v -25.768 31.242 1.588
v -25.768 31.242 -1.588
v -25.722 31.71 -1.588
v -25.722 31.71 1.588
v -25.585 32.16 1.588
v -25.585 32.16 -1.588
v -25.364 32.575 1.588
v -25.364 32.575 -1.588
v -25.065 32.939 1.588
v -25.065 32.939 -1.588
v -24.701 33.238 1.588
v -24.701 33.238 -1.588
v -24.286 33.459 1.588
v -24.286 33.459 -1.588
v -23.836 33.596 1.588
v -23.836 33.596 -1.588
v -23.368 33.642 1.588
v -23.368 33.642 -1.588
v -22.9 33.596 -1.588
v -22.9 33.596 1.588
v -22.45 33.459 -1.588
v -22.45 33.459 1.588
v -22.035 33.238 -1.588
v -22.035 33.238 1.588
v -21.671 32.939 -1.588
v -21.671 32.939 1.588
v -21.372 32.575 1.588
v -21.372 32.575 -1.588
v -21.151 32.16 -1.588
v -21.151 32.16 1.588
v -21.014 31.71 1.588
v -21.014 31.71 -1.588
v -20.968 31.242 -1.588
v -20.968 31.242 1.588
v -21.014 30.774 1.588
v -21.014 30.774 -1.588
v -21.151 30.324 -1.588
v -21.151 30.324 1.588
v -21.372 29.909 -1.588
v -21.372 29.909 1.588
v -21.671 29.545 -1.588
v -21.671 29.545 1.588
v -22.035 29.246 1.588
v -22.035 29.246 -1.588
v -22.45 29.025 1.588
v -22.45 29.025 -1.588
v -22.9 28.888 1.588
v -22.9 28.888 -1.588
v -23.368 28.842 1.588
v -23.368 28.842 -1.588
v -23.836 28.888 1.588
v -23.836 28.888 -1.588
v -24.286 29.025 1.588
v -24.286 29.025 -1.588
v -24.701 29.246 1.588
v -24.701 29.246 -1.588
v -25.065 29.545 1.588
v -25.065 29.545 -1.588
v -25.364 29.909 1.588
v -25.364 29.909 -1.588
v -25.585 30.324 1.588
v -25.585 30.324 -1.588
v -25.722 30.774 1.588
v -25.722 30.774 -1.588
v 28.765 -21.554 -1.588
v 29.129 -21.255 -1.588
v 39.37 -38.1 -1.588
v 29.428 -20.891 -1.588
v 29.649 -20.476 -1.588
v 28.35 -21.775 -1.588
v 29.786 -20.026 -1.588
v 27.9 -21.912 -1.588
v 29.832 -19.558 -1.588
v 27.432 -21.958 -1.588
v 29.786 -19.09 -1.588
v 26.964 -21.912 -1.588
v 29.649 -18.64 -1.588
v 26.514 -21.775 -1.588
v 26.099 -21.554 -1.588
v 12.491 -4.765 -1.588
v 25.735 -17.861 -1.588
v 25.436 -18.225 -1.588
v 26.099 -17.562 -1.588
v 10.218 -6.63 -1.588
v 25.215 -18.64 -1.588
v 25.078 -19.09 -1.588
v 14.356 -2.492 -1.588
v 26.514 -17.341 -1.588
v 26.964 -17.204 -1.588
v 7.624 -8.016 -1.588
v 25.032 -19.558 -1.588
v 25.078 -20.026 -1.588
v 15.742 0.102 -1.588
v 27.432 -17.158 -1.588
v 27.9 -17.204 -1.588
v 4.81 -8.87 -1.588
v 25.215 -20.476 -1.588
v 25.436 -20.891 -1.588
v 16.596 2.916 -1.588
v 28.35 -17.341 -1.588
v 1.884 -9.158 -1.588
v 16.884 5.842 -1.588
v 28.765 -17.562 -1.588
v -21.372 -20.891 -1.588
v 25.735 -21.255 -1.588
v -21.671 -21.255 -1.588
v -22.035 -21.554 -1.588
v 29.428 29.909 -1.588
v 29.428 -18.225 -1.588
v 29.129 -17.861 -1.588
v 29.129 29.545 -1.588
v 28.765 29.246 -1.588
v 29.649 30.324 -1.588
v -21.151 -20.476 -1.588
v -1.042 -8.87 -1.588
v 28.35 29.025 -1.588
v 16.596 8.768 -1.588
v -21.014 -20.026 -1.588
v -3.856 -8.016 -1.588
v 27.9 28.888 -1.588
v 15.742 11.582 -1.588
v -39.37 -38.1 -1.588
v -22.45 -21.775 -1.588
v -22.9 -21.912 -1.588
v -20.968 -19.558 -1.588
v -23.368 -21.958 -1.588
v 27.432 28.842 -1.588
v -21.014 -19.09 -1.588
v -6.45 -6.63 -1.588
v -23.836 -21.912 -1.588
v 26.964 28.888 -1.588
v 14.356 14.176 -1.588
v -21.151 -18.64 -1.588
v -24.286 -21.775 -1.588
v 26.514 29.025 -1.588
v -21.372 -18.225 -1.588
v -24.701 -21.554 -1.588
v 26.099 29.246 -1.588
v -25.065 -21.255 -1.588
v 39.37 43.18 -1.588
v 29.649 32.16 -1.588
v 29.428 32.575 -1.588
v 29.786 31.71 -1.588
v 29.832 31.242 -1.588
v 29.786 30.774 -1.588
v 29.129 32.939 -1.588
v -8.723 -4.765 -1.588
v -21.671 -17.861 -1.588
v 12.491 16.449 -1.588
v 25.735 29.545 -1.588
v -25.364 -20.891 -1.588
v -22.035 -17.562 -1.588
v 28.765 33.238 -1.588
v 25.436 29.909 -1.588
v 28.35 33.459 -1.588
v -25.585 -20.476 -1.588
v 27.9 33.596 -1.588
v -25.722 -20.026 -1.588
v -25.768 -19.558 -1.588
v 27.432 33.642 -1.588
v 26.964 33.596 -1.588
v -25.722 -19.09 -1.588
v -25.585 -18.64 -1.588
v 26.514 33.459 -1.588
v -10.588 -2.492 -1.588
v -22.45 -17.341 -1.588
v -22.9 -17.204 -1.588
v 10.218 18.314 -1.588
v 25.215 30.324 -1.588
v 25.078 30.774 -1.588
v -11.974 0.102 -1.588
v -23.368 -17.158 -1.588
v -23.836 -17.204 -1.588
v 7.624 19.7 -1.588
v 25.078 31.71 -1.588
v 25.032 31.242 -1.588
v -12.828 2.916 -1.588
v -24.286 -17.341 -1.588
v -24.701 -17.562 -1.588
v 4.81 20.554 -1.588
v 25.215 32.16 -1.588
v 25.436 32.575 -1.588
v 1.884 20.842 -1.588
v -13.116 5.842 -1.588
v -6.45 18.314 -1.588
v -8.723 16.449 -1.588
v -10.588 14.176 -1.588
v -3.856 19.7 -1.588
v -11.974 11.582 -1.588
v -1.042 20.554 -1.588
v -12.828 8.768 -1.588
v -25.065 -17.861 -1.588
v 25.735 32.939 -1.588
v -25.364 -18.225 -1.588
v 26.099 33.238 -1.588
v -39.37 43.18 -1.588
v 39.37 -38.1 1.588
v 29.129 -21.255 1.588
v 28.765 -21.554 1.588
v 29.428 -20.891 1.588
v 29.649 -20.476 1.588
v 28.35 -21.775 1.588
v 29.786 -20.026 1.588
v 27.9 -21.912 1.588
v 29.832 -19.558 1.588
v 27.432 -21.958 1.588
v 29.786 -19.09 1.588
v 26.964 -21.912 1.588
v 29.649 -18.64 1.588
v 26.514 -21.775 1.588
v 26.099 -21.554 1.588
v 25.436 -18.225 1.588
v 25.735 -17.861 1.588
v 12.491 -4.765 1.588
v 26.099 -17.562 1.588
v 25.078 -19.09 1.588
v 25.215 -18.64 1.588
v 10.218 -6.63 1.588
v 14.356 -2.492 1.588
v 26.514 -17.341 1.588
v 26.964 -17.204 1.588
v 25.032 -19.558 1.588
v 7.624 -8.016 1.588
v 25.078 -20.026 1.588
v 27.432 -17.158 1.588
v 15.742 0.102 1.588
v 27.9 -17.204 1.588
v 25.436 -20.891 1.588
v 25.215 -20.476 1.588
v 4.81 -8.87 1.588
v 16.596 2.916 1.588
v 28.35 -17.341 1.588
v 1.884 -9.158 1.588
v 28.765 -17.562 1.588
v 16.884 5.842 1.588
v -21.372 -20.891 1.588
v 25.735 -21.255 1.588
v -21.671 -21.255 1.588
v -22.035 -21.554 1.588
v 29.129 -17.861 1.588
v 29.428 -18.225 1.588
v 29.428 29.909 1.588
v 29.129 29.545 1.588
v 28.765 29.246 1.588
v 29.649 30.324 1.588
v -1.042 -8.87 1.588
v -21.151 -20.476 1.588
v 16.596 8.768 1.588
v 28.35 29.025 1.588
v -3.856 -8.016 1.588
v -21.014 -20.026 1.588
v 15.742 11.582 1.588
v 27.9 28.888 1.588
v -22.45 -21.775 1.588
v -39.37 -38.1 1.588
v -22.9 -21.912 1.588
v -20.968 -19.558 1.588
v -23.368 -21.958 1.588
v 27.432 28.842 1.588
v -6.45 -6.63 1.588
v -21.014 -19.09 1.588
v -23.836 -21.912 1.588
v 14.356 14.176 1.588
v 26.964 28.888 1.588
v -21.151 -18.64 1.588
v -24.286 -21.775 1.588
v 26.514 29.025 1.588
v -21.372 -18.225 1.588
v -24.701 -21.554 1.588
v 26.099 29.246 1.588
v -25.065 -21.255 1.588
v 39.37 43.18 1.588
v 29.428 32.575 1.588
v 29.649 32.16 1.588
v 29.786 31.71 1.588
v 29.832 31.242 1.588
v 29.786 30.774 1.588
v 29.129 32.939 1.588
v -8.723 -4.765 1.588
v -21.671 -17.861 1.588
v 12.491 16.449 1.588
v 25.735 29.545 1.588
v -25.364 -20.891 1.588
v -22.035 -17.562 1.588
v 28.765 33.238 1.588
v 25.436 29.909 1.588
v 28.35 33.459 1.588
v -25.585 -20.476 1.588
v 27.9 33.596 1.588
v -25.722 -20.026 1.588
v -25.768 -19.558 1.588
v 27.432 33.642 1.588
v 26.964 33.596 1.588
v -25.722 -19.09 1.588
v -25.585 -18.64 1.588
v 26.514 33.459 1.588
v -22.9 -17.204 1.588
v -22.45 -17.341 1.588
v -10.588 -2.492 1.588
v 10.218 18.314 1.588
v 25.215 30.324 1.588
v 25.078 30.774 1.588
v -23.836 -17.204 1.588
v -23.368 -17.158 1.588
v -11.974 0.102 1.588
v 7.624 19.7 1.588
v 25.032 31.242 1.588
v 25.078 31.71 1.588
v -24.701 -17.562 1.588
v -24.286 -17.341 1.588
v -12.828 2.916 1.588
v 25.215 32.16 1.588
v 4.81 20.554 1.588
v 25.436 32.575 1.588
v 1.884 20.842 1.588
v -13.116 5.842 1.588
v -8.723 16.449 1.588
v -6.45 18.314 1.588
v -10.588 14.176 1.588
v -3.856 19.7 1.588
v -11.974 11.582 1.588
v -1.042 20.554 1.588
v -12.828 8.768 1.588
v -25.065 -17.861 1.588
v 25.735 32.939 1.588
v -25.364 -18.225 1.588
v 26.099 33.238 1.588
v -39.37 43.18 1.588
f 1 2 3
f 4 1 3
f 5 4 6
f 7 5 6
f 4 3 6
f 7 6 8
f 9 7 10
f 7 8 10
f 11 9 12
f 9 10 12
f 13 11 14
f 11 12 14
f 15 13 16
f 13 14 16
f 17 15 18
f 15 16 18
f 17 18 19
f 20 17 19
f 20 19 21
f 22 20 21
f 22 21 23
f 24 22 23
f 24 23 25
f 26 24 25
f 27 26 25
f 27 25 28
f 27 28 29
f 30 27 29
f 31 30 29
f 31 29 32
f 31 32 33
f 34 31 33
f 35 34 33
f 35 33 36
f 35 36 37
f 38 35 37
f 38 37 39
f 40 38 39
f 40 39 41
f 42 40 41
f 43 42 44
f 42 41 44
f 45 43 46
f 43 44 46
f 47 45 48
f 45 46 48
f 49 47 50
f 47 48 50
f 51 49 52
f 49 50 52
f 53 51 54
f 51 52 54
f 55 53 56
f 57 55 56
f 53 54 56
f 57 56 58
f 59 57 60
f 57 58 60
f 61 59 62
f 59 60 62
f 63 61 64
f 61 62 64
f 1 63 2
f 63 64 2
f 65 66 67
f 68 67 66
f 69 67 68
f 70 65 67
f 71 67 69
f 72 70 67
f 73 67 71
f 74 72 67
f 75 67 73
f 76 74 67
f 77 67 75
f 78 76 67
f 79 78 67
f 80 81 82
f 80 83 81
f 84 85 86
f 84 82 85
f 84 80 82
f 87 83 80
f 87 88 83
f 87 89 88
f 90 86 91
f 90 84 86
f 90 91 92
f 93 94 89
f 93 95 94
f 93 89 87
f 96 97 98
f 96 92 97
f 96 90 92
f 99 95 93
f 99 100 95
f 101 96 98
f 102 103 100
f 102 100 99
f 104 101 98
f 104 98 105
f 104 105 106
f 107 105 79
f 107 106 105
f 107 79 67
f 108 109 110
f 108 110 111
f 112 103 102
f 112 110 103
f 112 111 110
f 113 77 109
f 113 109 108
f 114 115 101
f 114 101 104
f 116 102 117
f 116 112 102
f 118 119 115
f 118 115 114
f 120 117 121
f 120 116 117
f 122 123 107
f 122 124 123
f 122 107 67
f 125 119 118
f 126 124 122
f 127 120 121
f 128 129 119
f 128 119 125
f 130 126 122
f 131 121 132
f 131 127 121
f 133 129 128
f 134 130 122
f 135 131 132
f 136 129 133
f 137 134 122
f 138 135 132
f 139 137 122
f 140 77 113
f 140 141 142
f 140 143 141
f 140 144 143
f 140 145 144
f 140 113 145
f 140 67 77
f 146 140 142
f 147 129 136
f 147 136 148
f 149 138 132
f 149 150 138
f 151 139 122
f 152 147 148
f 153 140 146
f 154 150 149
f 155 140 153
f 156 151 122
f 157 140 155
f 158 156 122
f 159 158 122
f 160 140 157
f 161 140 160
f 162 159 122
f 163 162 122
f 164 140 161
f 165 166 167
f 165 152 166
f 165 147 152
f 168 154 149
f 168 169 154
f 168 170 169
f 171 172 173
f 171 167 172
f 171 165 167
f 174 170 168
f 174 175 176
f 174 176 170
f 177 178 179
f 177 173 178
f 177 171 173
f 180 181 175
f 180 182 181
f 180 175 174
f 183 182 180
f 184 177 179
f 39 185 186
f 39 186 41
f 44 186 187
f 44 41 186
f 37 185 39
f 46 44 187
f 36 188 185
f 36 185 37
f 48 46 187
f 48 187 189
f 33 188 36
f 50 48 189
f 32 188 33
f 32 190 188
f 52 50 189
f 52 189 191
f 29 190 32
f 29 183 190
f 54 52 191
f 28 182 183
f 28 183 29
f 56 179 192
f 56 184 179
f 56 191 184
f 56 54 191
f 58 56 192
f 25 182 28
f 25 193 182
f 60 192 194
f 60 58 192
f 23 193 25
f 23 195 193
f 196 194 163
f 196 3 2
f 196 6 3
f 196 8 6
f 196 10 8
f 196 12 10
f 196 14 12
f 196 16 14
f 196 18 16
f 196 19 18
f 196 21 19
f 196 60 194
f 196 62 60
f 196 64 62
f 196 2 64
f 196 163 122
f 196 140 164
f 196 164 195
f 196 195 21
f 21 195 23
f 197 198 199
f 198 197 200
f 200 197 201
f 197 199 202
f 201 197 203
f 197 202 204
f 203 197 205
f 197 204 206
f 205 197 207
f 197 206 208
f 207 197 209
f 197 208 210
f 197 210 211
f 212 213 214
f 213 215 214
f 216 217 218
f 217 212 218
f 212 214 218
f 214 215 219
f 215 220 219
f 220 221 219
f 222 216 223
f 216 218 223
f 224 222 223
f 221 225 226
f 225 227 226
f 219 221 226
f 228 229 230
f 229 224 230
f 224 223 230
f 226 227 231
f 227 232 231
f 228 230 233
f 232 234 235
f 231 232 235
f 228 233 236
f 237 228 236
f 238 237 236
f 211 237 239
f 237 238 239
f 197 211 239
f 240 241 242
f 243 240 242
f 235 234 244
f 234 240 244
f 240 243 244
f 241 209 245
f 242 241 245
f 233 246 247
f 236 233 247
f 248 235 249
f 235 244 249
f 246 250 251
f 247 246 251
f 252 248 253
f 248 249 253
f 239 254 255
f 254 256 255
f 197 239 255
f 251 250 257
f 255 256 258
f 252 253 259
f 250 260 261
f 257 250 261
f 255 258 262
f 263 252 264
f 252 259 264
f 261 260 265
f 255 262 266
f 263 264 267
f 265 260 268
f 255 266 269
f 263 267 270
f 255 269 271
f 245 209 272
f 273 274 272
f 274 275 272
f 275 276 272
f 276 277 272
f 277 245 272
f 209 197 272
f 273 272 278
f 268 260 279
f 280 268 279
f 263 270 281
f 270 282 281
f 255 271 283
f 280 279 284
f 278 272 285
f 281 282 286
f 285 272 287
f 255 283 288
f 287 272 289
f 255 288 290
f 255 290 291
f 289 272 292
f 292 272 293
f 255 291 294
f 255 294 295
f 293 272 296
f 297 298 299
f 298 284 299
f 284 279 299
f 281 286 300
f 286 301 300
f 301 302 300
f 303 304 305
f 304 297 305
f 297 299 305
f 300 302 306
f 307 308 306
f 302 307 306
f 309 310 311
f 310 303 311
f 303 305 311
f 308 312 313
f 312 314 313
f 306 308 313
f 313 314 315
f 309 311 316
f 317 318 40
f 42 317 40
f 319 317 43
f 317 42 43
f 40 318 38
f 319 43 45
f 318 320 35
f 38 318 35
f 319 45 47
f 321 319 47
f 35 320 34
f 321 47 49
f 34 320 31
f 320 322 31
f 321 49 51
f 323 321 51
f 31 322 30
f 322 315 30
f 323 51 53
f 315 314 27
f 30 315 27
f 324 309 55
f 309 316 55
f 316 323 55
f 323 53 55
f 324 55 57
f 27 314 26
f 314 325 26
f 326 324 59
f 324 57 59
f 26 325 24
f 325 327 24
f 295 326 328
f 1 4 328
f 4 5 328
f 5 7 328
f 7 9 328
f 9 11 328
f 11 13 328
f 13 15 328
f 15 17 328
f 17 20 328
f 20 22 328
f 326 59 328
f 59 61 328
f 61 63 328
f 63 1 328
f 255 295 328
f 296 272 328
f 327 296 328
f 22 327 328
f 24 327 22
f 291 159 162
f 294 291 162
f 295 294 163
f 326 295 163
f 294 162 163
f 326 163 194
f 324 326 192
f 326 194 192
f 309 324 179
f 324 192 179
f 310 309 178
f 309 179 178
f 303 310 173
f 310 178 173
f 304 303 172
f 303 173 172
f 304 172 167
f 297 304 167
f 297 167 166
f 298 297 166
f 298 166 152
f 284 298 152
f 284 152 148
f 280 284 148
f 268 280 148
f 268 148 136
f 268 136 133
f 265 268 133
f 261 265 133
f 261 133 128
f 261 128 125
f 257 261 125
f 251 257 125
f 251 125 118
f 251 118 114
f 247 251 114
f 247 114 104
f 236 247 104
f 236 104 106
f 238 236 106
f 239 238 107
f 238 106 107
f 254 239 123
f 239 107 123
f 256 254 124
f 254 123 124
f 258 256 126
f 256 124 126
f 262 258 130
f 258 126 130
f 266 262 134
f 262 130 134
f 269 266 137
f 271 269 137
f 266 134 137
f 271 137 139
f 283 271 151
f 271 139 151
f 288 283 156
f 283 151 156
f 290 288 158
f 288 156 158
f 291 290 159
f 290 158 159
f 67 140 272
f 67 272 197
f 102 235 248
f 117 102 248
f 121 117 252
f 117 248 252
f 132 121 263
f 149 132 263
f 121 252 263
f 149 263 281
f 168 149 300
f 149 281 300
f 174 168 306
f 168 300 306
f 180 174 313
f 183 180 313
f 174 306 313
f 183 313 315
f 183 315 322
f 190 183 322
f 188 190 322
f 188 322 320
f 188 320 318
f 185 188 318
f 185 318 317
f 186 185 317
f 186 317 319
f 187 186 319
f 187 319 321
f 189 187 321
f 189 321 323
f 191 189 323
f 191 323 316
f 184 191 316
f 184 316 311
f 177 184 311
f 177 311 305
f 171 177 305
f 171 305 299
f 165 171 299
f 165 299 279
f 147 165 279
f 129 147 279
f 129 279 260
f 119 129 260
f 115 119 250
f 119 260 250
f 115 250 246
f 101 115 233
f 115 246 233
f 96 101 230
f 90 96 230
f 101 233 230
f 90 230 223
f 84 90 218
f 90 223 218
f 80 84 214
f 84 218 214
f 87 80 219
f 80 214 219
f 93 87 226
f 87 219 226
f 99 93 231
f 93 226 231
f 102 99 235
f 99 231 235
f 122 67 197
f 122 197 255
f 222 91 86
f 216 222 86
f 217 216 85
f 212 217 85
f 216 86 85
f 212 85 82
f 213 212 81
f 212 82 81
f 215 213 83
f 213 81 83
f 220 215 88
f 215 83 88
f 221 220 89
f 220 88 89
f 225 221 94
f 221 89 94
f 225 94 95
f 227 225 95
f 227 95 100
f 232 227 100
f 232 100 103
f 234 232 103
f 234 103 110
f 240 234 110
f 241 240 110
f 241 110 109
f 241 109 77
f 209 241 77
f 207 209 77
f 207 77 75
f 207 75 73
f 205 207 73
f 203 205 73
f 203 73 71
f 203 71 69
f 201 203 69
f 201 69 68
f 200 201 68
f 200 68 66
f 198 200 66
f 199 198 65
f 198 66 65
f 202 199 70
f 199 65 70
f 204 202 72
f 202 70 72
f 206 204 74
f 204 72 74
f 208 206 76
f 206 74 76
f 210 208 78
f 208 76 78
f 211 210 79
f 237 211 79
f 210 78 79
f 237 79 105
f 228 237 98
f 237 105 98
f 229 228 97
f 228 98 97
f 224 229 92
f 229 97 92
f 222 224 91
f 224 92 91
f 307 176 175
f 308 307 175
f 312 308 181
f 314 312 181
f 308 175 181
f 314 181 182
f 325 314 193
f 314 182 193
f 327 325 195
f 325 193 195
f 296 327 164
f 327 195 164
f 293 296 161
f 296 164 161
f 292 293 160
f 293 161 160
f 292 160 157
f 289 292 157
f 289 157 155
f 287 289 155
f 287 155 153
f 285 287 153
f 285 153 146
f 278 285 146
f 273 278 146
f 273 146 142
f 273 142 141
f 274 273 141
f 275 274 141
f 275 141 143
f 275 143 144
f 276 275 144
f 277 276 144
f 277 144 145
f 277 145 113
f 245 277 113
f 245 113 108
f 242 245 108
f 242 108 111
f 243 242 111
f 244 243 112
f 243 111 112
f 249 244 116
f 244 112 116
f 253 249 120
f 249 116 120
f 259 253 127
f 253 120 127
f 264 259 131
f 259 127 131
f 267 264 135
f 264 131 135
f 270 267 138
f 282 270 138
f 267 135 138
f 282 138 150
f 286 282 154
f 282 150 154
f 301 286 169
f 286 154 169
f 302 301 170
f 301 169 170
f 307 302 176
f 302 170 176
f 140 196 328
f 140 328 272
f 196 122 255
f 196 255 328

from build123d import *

# Parameters (mm, degrees)
SKETCH2_W            = 68.58
SKETCH2_H            = 76.2
BOSS_EXTRUDE1_DEPTH  = 1.5875
M4_CLEARANCE_HOLE1_D = 4.8
SKETCH5_R            = 15
CUT_EXTRUDE1_DEPTH   = 52.356545104
BOSS_EXTRUDE2_DEPTH  = 3.175


with BuildPart() as part:
    # Sketch2 → Boss-Extrude1 (new, symmetric)
    with BuildSketch(Plane.XY):
        Rectangle(SKETCH2_W, SKETCH2_H)
    extrude(amount=BOSS_EXTRUDE1_DEPTH, both=True)

    # M4 Clearance Hole1 (through all)
    with Locations(Plane.XY.offset(1.5875)):
        with Locations((-23.368, -19.558), (-23.368, 31.242), (27.432, 31.242), (27.432, -19.558)):
            Hole(M4_CLEARANCE_HOLE1_D / 2)

    # Sketch5 → Cut-Extrude1 (cut, through all)
    with BuildSketch(Plane.XY.offset(1.5875)):
        with Locations((1.884, 5.842)):
            Circle(SKETCH5_R)
    extrude(amount=-CUT_EXTRUDE1_DEPTH, mode=Mode.SUBTRACT)

    # Sketch6 → Boss-Extrude2 (add, through all)
    with BuildSketch(Plane(origin=(0, 0, -1.5875), x_dir=(-1, 0, 0), z_dir=(0, 0, -1))):
        Polygon((-39.37, 43.18), (-39.37, -38.1), (-34.29, -38.1), (-34.29, 38.1), (34.29, 38.1), (34.29, -38.1), (39.37, -38.1), (39.37, 43.18), align=None)
    extrude(amount=-BOSS_EXTRUDE2_DEPTH)


solid = part.part
